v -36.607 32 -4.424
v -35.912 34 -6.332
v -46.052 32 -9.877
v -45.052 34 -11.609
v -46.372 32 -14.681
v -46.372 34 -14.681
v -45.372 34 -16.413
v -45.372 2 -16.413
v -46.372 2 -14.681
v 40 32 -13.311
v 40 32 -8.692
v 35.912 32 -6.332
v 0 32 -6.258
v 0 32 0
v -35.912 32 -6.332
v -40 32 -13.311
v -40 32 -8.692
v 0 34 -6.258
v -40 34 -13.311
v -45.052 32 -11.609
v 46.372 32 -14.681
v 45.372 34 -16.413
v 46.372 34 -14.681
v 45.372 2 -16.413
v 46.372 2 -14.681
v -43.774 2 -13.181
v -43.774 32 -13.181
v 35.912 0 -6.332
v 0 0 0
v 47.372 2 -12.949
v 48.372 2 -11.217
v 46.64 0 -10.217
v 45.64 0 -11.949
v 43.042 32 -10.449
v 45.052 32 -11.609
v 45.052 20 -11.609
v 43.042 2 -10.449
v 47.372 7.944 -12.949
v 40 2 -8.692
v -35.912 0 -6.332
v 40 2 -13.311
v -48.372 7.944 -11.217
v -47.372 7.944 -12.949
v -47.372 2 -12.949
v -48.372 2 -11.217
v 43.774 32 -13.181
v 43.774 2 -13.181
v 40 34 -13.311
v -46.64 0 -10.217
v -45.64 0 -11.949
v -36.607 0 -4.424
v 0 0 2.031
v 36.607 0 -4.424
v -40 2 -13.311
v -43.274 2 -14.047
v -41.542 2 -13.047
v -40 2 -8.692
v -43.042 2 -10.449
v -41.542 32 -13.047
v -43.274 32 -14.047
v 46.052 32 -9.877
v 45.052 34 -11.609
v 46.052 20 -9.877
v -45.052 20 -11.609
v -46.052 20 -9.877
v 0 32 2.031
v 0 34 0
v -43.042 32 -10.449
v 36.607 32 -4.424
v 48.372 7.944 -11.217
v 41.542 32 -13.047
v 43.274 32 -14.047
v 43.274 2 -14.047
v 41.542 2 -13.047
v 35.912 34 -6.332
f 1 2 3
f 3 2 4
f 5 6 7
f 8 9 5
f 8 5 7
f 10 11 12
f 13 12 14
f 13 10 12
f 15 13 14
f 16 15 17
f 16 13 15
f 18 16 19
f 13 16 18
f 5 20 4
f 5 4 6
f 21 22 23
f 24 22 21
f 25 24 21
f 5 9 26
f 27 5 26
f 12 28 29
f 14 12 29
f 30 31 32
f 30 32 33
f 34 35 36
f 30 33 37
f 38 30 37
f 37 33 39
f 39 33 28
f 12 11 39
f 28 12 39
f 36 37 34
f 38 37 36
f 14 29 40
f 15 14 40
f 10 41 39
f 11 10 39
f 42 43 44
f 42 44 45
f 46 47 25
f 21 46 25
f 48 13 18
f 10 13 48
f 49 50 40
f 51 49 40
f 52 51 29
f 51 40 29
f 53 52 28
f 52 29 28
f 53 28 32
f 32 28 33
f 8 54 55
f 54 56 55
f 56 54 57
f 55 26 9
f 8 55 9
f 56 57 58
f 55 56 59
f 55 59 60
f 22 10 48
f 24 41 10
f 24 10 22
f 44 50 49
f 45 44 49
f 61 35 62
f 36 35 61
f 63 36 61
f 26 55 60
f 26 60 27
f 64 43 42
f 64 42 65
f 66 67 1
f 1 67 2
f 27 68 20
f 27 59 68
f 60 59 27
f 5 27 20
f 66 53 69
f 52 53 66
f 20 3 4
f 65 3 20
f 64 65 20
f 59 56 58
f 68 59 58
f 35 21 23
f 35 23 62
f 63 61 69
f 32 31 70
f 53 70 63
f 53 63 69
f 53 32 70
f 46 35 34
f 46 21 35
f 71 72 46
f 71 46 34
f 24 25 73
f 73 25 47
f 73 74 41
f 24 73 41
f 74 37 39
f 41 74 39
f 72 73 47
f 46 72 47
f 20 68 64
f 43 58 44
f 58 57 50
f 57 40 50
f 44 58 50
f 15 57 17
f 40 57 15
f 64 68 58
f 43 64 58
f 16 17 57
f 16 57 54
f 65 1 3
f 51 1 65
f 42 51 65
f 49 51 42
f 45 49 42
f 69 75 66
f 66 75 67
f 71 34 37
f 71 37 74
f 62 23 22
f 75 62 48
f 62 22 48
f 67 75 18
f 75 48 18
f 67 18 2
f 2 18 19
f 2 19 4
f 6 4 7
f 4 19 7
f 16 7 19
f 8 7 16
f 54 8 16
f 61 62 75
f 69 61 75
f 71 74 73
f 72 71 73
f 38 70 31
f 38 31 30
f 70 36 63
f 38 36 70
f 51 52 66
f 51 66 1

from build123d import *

# Parameters (mm, degrees)
BOSS_EXTRUDE2_DEPTH = 32
CUT_EXTRUDE2_DEPTH  = 2
CHAMFER3_SIZE       = 2
CUT_EXTRUDE3_DEPTH  = 2
BOSS_EXTRUDE4_DEPTH = 2
CHAMFER4_SIZE       = 2
CUT_EXTRUDE4_DEPTH  = 2
CUT_EXTRUDE5_DEPTH  = 30


with BuildPart() as part:
    # Sketch1 → Boss-Extrude2 (new body)
    with BuildSketch(Plane(origin=(0, 0, 0), x_dir=(1, 0, 0), z_dir=(0, 1, 0))):
        Polygon((-46.372280014218745, 14.680854952562456), (-42.04215299529653, 12.180854952562488), (-43.04215299529651, 10.448804144993609), (-47.372280014218724, 12.948804144993577), (-48.37228001421871, 11.216753337424702), (-36.60670775986293, 4.423897029202528), (1.0929e-13, -2.030853223771254), (36.60670775986312, 4.423897029202558), (48.37228001421891, 11.216753337424812), (47.37228001421898, 12.948804144993561), (43.04215299529678, 10.448804144993572), (42.04215299529679, 12.180854952562449), (46.37228001421899, 14.680854952562438), (45.372280014219, 16.412905760131313), (40, 13.31121844775995), (40, 8.692416294243028), (35.91211504919529, 6.332274817479665), (0, 0), (-35.91211504919526, 6.3322748174796235), (-40.00000000000001, 8.692416294243028), (-40.00000000000001, 13.311218447759854), (-45.37228001421887, 16.41290576013115), align=None)
    extrude(amount=BOSS_EXTRUDE2_DEPTH)

    # Sketch9 → Cut-Extrude2 (cut)
    with BuildSketch(Plane(origin=(6.236073334457828, 0, 10.801195855006485), x_dir=(-0.8660254037844402, 0, 0.4999999999999974), z_dir=(-0.4999999999999974, 0, -0.8660254037844402))):
        Polygon((-44.8209624184392, 20), (-47.50000000000022, 7.944330883818674), (-47.50000000000013, 32), (-44.8209624184392, 32), align=None)
    extrude(amount=-CUT_EXTRUDE2_DEPTH, mode=Mode.SUBTRACT)

    # Chamfer3
    chamfer3_edges = [part.edges().sort_by_distance(p)[0] for p in [
        (47.872280014218944, 0, -12.082778741209186),
        (-47.87228001421872, 0, -12.08277874120914),
    ]]
    chamfer(chamfer3_edges, length=CHAMFER3_SIZE)

    # Sketch8 → Cut-Extrude3 (cut)
    with BuildSketch(Plane(origin=(-6.236073334457578, 0, 10.801195855006183), x_dir=(-0.8660254037844388, 0, -0.49999999999999983), z_dir=(0.4999999999999998, 0, -0.8660254037844387))):
        Polygon((44.82096241843918, 32), (47.50000000000006, 32), (47.50000000000006, 7.944330883819361), (44.82096241843918, 20), align=None)
    extrude(amount=-CUT_EXTRUDE3_DEPTH, mode=Mode.SUBTRACT)

    # Sketch11 → Boss-Extrude4 (add)
    with BuildSketch(Plane(origin=(0, 32, 0), x_dir=(1, 0, 0), z_dir=(0, 1, 0))):
        Polygon((-46.37228001421867, 14.680854952562523), (-45.37228001421879, 16.4129057601312), (-40.00000000000001, 13.311218447759854), (-1.3184e-13, 6.258139219421286), (40, 13.31121844775995), (45.37228001421892, 16.412905760131267), (46.372280014218916, 14.680854952562392), (45.052165410893835, 11.609285354213014), (46.05216541089376, 9.87723454664427), (36.60670775986312, 4.423897029202558), (1.0929e-13, -2.030853223771254), (-36.60670775986293, 4.423897029202528), (-46.052165410893714, 9.877234546644353), (-45.0521654108937, 11.609285354213252), align=None)
    extrude(amount=BOSS_EXTRUDE4_DEPTH)

    # Chamfer4
    chamfer4_edges = [part.edges().sort_by_distance(p)[0] for p in [
        (18.303353879931613, 34, -1.1965219027156522),
        (-18.303353879931407, 34, -1.1965219027156366),
        (41.32943658537844, 34, -7.150565787923414),
        (-41.32943658537832, 34, -7.1505657879234406),
    ]]
    chamfer(chamfer4_edges, length=CHAMFER4_SIZE)

    # Sketch12 → Cut-Extrude4 (cut)
    with BuildSketch(Plane.XZ):
        Polygon((40, -8.692416294243028), (43.04215299529678, -10.448804144993572), (47.37228001421891, -12.948804144993517), (45.37228001421892, -16.412905760131267), (40, -13.31121844775995), align=None)
        Polygon((-47.37228001421867, -12.948804144993655), (-40.00000000000001, -8.692416294243028), (-40.00000000000001, -13.311218447759854), (-45.37228001421879, -16.4129057601312), align=None)
    extrude(amount=-CUT_EXTRUDE4_DEPTH, mode=Mode.SUBTRACT)

    # Sketch13 → Cut-Extrude5 (cut)
    with BuildSketch(Plane.XZ.offset(-2)):
        Polygon((43.04215299529678, -10.448804144993572), (42.04215299529679, -12.180854952562449), (41.54215299529678, -13.046880356346884), (43.27420380286566, -14.046880356346884), (44.774203802865564, -11.448804144993552), align=None)
        Polygon((-43.04215299529651, -10.448804144993609), (-42.04215299529653, -12.180854952562488), (-41.54215299529657, -13.046880356346884), (-43.27420380286547, -14.046880356346882), (-44.77420380286537, -11.448804144993701), align=None)
    extrude(amount=-CUT_EXTRUDE5_DEPTH, mode=Mode.SUBTRACT)


solid = part.part
